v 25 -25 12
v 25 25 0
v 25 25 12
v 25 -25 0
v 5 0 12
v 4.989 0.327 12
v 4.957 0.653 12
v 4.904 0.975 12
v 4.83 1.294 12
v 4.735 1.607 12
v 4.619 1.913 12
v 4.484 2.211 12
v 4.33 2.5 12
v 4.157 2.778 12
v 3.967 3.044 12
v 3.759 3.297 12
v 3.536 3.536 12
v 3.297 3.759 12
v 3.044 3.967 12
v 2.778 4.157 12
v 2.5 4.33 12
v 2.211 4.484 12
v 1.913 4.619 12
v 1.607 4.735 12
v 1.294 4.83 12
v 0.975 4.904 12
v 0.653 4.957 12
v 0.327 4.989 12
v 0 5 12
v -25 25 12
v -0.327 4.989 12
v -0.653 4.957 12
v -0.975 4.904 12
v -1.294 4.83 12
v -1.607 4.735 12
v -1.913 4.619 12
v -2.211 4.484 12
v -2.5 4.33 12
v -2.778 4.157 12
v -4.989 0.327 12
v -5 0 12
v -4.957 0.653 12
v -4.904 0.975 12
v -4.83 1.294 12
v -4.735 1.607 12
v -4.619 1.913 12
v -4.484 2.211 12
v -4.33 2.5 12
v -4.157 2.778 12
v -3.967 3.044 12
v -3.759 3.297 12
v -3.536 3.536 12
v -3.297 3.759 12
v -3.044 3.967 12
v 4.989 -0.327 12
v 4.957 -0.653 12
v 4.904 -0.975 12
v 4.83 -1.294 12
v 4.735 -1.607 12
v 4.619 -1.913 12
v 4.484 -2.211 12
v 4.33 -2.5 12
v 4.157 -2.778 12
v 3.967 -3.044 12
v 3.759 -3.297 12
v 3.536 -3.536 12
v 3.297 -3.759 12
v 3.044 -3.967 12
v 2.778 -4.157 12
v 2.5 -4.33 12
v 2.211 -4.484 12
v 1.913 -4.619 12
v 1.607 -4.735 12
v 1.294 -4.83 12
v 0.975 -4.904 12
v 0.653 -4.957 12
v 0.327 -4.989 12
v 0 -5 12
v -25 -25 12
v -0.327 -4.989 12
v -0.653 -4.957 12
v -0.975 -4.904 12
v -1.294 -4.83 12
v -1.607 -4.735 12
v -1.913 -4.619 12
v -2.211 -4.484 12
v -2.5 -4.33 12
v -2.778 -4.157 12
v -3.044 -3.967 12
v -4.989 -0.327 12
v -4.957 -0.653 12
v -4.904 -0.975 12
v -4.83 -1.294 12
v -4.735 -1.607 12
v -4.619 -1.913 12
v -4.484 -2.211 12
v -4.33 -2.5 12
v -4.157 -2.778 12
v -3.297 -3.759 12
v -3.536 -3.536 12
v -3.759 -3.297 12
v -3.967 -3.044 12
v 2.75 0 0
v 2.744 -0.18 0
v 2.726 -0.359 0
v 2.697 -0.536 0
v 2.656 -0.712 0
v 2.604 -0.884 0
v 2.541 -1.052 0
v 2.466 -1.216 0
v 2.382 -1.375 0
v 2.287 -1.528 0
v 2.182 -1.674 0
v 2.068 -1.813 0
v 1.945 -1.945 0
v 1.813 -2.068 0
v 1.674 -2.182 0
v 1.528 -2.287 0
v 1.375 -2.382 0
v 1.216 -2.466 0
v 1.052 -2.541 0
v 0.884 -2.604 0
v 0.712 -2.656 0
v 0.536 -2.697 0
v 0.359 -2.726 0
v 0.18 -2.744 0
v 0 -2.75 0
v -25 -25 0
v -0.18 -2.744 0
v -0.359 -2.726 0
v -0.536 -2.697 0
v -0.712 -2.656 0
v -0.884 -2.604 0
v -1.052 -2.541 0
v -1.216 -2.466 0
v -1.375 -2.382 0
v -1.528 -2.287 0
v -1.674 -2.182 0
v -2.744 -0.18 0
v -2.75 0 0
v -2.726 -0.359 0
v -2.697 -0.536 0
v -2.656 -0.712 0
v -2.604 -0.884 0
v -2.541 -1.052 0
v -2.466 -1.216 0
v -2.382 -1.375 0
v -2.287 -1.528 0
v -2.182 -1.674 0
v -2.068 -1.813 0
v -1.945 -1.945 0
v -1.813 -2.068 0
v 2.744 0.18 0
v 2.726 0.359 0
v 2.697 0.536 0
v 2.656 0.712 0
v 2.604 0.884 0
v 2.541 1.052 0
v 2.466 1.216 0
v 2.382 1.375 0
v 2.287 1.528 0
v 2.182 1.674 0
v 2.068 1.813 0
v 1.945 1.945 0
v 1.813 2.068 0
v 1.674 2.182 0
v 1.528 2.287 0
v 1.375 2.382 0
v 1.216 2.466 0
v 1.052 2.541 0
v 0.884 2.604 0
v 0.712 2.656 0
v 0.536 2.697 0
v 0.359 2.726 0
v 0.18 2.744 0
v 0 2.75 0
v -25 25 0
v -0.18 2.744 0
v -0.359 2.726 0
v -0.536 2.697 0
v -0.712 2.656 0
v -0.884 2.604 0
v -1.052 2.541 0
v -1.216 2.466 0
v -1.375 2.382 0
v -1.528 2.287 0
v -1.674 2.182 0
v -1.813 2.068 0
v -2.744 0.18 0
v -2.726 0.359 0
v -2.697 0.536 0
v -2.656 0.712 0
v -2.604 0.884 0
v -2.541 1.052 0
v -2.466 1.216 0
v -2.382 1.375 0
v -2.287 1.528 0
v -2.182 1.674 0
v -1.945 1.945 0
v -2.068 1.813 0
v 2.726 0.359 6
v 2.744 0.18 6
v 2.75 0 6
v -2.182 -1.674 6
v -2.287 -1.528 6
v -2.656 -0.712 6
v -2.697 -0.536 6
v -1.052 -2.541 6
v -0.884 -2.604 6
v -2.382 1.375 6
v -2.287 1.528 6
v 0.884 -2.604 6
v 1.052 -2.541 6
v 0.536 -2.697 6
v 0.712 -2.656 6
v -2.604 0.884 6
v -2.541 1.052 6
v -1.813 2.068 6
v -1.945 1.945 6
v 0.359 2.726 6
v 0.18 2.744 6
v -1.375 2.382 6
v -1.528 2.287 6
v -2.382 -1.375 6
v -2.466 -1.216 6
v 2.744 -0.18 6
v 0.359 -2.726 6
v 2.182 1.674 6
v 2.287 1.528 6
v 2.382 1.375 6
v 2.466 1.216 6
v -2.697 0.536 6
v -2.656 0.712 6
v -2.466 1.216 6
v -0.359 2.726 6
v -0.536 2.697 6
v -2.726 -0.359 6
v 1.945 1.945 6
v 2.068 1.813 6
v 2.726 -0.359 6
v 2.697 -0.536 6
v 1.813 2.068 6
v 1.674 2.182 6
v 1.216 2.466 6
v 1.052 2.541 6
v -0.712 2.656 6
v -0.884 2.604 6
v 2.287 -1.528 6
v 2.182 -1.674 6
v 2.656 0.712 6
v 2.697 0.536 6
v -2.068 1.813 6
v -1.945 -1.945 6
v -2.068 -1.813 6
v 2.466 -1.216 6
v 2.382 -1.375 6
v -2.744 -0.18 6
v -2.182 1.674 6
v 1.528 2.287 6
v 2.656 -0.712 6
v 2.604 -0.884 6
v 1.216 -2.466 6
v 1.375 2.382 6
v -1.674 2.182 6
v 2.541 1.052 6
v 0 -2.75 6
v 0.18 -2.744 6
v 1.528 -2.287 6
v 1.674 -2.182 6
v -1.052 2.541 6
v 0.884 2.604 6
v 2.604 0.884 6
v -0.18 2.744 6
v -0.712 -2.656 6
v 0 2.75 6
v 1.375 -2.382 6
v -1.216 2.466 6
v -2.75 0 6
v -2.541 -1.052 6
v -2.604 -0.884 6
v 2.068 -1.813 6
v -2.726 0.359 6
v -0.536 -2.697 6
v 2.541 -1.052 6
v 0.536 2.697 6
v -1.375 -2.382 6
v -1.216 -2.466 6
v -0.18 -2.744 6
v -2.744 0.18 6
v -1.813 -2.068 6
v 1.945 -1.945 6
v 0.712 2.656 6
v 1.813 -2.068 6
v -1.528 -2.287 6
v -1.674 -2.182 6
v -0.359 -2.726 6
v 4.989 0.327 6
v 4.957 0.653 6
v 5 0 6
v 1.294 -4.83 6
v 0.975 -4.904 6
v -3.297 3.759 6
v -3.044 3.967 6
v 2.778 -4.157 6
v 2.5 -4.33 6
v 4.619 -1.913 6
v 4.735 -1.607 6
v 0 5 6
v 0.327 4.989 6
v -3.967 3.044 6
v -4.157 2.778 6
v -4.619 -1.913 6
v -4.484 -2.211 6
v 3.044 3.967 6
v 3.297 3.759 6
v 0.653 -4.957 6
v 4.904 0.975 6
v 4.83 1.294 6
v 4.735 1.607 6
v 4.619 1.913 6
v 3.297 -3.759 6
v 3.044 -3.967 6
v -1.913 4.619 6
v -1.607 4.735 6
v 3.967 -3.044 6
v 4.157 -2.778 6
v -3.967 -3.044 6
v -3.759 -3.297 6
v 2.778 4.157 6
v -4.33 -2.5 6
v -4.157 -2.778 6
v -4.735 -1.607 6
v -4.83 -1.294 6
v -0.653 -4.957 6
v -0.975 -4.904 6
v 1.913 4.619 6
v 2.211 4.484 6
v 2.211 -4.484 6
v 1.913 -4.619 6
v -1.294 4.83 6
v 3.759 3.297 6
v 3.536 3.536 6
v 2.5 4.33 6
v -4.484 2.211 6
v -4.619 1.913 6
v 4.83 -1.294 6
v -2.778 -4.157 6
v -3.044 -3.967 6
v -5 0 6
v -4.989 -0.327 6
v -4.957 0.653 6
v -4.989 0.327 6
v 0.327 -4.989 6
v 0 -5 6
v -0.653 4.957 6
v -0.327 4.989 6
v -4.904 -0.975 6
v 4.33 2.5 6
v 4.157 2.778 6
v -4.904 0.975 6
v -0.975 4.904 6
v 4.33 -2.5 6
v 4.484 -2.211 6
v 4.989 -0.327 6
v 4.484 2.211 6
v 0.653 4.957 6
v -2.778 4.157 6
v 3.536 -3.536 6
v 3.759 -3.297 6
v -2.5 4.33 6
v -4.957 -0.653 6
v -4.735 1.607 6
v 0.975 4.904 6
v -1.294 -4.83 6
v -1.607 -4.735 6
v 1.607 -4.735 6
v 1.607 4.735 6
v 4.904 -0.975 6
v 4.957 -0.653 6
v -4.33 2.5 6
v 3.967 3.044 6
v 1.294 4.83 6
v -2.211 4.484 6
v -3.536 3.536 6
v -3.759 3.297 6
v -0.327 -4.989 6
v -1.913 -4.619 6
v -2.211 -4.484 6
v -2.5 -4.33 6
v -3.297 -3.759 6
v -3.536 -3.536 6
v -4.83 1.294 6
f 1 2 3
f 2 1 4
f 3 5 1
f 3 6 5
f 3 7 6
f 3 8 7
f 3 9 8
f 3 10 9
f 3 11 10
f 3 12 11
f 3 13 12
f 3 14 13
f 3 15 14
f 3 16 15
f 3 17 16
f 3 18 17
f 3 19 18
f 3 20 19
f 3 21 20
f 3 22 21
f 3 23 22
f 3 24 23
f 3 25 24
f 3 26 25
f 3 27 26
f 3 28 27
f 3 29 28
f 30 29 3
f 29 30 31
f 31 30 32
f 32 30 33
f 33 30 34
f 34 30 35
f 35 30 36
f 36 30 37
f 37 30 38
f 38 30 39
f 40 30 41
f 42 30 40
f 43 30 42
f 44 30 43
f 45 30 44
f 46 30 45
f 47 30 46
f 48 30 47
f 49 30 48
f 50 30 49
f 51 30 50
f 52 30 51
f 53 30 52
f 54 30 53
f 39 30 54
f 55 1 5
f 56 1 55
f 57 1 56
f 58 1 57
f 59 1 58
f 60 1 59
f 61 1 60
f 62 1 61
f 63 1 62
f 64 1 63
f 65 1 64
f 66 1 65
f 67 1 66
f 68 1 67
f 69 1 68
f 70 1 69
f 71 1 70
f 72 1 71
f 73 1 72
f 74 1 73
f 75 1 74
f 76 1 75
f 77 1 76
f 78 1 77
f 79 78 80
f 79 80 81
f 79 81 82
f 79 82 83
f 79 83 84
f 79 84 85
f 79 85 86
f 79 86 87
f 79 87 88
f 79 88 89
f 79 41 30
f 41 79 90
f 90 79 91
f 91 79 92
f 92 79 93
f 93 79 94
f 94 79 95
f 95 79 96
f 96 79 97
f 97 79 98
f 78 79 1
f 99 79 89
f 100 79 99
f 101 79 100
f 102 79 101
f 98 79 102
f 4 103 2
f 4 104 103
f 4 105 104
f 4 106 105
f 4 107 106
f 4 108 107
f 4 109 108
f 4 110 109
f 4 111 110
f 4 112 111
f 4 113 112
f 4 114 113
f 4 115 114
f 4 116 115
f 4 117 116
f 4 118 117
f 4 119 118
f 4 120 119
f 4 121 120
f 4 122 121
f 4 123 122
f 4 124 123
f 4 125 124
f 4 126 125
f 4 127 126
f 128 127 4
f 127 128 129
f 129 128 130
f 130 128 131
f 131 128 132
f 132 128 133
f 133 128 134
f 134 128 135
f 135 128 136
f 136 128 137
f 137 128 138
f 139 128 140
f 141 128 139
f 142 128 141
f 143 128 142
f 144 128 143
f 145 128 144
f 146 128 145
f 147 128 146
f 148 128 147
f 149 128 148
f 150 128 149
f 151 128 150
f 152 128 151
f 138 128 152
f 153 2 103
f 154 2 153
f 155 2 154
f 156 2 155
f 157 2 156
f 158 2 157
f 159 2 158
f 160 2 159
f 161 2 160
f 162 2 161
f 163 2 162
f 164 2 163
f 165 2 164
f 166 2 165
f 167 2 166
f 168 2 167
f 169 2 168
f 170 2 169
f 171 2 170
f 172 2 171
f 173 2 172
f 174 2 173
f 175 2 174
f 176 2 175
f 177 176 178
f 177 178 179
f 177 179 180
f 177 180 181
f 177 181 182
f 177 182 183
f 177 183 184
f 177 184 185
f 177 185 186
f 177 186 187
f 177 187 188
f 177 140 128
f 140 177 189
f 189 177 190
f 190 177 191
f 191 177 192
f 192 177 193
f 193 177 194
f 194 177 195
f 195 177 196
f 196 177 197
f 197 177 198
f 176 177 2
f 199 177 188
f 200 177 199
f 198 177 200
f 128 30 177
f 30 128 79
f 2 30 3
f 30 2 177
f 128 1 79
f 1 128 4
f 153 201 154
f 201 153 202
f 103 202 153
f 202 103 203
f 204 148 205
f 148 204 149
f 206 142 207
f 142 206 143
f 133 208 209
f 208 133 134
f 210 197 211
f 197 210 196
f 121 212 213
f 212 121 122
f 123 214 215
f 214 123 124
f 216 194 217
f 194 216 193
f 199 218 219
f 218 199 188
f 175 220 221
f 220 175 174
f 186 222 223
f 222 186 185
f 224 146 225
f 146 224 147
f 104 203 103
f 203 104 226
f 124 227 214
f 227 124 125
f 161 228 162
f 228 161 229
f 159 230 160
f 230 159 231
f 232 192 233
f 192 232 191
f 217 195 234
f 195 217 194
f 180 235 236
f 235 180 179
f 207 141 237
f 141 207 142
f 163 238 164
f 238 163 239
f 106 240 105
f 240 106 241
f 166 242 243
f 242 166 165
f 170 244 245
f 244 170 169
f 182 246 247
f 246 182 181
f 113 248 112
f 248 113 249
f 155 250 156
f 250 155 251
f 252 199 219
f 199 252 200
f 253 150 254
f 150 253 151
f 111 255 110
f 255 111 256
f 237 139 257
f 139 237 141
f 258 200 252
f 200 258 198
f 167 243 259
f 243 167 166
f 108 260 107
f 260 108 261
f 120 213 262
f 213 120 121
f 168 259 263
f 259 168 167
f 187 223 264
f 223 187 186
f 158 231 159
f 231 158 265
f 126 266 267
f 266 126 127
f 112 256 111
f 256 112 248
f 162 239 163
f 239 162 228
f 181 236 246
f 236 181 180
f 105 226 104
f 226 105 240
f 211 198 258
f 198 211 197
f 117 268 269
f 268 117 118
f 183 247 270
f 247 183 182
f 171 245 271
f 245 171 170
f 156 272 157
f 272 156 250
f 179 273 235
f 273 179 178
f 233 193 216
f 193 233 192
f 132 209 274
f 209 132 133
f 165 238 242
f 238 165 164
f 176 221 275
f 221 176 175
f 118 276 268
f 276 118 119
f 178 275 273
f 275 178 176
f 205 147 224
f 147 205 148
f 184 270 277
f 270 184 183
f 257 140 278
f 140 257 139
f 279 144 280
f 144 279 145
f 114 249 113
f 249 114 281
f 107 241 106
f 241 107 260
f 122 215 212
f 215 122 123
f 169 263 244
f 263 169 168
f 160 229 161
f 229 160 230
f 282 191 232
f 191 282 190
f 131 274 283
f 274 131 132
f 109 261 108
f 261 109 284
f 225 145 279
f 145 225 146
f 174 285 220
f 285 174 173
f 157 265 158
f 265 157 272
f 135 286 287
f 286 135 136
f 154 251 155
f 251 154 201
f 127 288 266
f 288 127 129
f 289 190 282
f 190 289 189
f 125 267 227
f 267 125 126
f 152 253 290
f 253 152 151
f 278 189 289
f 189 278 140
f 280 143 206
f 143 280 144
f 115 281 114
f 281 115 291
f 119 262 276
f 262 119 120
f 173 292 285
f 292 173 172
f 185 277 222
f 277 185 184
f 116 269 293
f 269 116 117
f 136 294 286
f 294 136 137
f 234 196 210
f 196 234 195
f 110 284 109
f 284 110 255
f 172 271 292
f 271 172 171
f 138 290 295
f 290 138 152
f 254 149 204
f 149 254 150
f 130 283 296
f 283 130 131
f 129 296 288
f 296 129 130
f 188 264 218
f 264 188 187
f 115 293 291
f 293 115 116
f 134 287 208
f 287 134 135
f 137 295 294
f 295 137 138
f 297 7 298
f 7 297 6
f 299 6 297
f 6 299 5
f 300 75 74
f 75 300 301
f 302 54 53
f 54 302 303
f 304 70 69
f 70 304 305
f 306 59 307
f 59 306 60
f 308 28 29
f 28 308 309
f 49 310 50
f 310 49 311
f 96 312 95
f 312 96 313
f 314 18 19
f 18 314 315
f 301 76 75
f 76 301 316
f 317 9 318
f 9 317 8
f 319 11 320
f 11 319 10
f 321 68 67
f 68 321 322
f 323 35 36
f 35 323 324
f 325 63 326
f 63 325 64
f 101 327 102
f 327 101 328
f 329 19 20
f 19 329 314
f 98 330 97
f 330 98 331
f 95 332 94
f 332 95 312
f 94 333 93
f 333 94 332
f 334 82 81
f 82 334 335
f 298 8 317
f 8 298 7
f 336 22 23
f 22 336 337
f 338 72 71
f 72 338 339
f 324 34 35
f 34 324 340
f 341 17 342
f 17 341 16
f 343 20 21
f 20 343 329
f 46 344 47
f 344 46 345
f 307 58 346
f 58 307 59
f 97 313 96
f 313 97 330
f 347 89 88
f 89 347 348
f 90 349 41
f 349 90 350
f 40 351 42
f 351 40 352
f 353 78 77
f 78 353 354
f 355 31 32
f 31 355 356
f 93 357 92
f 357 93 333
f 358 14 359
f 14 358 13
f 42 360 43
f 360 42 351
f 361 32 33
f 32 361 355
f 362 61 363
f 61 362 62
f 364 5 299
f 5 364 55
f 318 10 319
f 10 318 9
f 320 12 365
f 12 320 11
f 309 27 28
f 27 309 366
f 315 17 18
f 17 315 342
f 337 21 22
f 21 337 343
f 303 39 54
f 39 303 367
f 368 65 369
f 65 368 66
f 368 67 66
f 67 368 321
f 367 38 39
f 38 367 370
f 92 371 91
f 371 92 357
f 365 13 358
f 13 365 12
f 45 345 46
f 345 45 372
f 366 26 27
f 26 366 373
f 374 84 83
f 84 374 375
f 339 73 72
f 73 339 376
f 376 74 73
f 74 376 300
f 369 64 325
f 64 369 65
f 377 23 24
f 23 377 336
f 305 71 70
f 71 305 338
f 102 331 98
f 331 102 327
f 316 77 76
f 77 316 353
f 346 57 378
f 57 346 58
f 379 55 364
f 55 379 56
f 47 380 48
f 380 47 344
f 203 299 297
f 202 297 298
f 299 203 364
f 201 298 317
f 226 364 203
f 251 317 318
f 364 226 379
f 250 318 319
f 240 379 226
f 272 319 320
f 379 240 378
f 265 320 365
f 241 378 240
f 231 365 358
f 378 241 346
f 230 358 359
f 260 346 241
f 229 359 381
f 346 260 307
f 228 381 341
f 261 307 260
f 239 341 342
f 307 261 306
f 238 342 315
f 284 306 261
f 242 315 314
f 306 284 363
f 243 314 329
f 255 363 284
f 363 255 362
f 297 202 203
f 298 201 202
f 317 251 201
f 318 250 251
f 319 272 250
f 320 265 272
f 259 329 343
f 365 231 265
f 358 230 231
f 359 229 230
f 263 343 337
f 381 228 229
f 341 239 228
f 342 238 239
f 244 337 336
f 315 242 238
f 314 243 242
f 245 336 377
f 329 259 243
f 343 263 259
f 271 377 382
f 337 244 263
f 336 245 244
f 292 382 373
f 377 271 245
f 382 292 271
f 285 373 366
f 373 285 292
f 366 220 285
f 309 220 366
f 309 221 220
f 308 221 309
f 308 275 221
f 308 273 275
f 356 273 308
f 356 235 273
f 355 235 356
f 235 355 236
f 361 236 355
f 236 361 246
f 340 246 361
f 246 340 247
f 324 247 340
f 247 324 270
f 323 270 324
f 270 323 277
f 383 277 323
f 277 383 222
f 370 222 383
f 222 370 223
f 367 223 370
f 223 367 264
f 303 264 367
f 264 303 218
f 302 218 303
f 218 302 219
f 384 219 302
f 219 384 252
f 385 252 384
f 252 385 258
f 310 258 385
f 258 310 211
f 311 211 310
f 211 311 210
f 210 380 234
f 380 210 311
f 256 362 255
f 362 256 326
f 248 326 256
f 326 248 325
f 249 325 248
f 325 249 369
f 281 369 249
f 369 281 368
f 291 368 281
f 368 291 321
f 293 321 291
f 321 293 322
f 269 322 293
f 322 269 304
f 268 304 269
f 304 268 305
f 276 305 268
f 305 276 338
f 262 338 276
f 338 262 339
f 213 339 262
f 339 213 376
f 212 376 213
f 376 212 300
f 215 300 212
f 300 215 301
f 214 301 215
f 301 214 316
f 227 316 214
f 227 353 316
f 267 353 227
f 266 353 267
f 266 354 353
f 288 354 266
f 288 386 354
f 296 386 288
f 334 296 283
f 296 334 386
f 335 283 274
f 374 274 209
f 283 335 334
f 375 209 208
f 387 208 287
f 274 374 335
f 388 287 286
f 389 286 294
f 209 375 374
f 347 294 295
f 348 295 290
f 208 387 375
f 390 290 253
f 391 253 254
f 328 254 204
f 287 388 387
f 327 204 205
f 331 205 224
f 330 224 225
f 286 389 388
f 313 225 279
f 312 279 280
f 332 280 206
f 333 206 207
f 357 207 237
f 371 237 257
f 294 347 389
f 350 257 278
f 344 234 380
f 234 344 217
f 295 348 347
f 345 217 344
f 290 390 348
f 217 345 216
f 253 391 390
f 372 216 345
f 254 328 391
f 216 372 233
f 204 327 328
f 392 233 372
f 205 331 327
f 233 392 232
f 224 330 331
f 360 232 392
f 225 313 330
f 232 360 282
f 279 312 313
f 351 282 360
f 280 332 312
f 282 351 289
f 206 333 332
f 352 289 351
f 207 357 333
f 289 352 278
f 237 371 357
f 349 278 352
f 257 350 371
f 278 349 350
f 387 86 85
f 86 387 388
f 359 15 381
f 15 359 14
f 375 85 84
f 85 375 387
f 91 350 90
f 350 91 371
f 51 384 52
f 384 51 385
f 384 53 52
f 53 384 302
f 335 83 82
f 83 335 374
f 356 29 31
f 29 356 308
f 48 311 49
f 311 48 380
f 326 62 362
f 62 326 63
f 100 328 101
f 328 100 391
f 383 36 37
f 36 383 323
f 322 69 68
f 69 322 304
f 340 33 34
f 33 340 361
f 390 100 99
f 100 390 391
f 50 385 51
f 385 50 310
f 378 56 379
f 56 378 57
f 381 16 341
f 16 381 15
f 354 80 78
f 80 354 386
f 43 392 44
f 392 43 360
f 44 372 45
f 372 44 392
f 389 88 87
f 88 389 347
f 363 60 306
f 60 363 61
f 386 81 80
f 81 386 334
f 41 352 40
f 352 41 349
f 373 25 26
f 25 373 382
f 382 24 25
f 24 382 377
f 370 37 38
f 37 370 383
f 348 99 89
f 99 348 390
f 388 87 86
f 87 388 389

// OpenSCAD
plate_size = 50; plate_thickness = 12; bore_diameter = 5.5; counterbore_diameter = 10; counterbore_depth = 6;
$fn = 96;
difference() {
  translate([-plate_size/2, -plate_size/2, 0]) cube([plate_size, plate_size, plate_thickness]);
  translate([0, 0, -1]) cylinder(d = bore_diameter, h = plate_thickness + 2);
  translate([0, 0, plate_thickness - counterbore_depth]) cylinder(d = counterbore_diameter, h = counterbore_depth + 1);
}
